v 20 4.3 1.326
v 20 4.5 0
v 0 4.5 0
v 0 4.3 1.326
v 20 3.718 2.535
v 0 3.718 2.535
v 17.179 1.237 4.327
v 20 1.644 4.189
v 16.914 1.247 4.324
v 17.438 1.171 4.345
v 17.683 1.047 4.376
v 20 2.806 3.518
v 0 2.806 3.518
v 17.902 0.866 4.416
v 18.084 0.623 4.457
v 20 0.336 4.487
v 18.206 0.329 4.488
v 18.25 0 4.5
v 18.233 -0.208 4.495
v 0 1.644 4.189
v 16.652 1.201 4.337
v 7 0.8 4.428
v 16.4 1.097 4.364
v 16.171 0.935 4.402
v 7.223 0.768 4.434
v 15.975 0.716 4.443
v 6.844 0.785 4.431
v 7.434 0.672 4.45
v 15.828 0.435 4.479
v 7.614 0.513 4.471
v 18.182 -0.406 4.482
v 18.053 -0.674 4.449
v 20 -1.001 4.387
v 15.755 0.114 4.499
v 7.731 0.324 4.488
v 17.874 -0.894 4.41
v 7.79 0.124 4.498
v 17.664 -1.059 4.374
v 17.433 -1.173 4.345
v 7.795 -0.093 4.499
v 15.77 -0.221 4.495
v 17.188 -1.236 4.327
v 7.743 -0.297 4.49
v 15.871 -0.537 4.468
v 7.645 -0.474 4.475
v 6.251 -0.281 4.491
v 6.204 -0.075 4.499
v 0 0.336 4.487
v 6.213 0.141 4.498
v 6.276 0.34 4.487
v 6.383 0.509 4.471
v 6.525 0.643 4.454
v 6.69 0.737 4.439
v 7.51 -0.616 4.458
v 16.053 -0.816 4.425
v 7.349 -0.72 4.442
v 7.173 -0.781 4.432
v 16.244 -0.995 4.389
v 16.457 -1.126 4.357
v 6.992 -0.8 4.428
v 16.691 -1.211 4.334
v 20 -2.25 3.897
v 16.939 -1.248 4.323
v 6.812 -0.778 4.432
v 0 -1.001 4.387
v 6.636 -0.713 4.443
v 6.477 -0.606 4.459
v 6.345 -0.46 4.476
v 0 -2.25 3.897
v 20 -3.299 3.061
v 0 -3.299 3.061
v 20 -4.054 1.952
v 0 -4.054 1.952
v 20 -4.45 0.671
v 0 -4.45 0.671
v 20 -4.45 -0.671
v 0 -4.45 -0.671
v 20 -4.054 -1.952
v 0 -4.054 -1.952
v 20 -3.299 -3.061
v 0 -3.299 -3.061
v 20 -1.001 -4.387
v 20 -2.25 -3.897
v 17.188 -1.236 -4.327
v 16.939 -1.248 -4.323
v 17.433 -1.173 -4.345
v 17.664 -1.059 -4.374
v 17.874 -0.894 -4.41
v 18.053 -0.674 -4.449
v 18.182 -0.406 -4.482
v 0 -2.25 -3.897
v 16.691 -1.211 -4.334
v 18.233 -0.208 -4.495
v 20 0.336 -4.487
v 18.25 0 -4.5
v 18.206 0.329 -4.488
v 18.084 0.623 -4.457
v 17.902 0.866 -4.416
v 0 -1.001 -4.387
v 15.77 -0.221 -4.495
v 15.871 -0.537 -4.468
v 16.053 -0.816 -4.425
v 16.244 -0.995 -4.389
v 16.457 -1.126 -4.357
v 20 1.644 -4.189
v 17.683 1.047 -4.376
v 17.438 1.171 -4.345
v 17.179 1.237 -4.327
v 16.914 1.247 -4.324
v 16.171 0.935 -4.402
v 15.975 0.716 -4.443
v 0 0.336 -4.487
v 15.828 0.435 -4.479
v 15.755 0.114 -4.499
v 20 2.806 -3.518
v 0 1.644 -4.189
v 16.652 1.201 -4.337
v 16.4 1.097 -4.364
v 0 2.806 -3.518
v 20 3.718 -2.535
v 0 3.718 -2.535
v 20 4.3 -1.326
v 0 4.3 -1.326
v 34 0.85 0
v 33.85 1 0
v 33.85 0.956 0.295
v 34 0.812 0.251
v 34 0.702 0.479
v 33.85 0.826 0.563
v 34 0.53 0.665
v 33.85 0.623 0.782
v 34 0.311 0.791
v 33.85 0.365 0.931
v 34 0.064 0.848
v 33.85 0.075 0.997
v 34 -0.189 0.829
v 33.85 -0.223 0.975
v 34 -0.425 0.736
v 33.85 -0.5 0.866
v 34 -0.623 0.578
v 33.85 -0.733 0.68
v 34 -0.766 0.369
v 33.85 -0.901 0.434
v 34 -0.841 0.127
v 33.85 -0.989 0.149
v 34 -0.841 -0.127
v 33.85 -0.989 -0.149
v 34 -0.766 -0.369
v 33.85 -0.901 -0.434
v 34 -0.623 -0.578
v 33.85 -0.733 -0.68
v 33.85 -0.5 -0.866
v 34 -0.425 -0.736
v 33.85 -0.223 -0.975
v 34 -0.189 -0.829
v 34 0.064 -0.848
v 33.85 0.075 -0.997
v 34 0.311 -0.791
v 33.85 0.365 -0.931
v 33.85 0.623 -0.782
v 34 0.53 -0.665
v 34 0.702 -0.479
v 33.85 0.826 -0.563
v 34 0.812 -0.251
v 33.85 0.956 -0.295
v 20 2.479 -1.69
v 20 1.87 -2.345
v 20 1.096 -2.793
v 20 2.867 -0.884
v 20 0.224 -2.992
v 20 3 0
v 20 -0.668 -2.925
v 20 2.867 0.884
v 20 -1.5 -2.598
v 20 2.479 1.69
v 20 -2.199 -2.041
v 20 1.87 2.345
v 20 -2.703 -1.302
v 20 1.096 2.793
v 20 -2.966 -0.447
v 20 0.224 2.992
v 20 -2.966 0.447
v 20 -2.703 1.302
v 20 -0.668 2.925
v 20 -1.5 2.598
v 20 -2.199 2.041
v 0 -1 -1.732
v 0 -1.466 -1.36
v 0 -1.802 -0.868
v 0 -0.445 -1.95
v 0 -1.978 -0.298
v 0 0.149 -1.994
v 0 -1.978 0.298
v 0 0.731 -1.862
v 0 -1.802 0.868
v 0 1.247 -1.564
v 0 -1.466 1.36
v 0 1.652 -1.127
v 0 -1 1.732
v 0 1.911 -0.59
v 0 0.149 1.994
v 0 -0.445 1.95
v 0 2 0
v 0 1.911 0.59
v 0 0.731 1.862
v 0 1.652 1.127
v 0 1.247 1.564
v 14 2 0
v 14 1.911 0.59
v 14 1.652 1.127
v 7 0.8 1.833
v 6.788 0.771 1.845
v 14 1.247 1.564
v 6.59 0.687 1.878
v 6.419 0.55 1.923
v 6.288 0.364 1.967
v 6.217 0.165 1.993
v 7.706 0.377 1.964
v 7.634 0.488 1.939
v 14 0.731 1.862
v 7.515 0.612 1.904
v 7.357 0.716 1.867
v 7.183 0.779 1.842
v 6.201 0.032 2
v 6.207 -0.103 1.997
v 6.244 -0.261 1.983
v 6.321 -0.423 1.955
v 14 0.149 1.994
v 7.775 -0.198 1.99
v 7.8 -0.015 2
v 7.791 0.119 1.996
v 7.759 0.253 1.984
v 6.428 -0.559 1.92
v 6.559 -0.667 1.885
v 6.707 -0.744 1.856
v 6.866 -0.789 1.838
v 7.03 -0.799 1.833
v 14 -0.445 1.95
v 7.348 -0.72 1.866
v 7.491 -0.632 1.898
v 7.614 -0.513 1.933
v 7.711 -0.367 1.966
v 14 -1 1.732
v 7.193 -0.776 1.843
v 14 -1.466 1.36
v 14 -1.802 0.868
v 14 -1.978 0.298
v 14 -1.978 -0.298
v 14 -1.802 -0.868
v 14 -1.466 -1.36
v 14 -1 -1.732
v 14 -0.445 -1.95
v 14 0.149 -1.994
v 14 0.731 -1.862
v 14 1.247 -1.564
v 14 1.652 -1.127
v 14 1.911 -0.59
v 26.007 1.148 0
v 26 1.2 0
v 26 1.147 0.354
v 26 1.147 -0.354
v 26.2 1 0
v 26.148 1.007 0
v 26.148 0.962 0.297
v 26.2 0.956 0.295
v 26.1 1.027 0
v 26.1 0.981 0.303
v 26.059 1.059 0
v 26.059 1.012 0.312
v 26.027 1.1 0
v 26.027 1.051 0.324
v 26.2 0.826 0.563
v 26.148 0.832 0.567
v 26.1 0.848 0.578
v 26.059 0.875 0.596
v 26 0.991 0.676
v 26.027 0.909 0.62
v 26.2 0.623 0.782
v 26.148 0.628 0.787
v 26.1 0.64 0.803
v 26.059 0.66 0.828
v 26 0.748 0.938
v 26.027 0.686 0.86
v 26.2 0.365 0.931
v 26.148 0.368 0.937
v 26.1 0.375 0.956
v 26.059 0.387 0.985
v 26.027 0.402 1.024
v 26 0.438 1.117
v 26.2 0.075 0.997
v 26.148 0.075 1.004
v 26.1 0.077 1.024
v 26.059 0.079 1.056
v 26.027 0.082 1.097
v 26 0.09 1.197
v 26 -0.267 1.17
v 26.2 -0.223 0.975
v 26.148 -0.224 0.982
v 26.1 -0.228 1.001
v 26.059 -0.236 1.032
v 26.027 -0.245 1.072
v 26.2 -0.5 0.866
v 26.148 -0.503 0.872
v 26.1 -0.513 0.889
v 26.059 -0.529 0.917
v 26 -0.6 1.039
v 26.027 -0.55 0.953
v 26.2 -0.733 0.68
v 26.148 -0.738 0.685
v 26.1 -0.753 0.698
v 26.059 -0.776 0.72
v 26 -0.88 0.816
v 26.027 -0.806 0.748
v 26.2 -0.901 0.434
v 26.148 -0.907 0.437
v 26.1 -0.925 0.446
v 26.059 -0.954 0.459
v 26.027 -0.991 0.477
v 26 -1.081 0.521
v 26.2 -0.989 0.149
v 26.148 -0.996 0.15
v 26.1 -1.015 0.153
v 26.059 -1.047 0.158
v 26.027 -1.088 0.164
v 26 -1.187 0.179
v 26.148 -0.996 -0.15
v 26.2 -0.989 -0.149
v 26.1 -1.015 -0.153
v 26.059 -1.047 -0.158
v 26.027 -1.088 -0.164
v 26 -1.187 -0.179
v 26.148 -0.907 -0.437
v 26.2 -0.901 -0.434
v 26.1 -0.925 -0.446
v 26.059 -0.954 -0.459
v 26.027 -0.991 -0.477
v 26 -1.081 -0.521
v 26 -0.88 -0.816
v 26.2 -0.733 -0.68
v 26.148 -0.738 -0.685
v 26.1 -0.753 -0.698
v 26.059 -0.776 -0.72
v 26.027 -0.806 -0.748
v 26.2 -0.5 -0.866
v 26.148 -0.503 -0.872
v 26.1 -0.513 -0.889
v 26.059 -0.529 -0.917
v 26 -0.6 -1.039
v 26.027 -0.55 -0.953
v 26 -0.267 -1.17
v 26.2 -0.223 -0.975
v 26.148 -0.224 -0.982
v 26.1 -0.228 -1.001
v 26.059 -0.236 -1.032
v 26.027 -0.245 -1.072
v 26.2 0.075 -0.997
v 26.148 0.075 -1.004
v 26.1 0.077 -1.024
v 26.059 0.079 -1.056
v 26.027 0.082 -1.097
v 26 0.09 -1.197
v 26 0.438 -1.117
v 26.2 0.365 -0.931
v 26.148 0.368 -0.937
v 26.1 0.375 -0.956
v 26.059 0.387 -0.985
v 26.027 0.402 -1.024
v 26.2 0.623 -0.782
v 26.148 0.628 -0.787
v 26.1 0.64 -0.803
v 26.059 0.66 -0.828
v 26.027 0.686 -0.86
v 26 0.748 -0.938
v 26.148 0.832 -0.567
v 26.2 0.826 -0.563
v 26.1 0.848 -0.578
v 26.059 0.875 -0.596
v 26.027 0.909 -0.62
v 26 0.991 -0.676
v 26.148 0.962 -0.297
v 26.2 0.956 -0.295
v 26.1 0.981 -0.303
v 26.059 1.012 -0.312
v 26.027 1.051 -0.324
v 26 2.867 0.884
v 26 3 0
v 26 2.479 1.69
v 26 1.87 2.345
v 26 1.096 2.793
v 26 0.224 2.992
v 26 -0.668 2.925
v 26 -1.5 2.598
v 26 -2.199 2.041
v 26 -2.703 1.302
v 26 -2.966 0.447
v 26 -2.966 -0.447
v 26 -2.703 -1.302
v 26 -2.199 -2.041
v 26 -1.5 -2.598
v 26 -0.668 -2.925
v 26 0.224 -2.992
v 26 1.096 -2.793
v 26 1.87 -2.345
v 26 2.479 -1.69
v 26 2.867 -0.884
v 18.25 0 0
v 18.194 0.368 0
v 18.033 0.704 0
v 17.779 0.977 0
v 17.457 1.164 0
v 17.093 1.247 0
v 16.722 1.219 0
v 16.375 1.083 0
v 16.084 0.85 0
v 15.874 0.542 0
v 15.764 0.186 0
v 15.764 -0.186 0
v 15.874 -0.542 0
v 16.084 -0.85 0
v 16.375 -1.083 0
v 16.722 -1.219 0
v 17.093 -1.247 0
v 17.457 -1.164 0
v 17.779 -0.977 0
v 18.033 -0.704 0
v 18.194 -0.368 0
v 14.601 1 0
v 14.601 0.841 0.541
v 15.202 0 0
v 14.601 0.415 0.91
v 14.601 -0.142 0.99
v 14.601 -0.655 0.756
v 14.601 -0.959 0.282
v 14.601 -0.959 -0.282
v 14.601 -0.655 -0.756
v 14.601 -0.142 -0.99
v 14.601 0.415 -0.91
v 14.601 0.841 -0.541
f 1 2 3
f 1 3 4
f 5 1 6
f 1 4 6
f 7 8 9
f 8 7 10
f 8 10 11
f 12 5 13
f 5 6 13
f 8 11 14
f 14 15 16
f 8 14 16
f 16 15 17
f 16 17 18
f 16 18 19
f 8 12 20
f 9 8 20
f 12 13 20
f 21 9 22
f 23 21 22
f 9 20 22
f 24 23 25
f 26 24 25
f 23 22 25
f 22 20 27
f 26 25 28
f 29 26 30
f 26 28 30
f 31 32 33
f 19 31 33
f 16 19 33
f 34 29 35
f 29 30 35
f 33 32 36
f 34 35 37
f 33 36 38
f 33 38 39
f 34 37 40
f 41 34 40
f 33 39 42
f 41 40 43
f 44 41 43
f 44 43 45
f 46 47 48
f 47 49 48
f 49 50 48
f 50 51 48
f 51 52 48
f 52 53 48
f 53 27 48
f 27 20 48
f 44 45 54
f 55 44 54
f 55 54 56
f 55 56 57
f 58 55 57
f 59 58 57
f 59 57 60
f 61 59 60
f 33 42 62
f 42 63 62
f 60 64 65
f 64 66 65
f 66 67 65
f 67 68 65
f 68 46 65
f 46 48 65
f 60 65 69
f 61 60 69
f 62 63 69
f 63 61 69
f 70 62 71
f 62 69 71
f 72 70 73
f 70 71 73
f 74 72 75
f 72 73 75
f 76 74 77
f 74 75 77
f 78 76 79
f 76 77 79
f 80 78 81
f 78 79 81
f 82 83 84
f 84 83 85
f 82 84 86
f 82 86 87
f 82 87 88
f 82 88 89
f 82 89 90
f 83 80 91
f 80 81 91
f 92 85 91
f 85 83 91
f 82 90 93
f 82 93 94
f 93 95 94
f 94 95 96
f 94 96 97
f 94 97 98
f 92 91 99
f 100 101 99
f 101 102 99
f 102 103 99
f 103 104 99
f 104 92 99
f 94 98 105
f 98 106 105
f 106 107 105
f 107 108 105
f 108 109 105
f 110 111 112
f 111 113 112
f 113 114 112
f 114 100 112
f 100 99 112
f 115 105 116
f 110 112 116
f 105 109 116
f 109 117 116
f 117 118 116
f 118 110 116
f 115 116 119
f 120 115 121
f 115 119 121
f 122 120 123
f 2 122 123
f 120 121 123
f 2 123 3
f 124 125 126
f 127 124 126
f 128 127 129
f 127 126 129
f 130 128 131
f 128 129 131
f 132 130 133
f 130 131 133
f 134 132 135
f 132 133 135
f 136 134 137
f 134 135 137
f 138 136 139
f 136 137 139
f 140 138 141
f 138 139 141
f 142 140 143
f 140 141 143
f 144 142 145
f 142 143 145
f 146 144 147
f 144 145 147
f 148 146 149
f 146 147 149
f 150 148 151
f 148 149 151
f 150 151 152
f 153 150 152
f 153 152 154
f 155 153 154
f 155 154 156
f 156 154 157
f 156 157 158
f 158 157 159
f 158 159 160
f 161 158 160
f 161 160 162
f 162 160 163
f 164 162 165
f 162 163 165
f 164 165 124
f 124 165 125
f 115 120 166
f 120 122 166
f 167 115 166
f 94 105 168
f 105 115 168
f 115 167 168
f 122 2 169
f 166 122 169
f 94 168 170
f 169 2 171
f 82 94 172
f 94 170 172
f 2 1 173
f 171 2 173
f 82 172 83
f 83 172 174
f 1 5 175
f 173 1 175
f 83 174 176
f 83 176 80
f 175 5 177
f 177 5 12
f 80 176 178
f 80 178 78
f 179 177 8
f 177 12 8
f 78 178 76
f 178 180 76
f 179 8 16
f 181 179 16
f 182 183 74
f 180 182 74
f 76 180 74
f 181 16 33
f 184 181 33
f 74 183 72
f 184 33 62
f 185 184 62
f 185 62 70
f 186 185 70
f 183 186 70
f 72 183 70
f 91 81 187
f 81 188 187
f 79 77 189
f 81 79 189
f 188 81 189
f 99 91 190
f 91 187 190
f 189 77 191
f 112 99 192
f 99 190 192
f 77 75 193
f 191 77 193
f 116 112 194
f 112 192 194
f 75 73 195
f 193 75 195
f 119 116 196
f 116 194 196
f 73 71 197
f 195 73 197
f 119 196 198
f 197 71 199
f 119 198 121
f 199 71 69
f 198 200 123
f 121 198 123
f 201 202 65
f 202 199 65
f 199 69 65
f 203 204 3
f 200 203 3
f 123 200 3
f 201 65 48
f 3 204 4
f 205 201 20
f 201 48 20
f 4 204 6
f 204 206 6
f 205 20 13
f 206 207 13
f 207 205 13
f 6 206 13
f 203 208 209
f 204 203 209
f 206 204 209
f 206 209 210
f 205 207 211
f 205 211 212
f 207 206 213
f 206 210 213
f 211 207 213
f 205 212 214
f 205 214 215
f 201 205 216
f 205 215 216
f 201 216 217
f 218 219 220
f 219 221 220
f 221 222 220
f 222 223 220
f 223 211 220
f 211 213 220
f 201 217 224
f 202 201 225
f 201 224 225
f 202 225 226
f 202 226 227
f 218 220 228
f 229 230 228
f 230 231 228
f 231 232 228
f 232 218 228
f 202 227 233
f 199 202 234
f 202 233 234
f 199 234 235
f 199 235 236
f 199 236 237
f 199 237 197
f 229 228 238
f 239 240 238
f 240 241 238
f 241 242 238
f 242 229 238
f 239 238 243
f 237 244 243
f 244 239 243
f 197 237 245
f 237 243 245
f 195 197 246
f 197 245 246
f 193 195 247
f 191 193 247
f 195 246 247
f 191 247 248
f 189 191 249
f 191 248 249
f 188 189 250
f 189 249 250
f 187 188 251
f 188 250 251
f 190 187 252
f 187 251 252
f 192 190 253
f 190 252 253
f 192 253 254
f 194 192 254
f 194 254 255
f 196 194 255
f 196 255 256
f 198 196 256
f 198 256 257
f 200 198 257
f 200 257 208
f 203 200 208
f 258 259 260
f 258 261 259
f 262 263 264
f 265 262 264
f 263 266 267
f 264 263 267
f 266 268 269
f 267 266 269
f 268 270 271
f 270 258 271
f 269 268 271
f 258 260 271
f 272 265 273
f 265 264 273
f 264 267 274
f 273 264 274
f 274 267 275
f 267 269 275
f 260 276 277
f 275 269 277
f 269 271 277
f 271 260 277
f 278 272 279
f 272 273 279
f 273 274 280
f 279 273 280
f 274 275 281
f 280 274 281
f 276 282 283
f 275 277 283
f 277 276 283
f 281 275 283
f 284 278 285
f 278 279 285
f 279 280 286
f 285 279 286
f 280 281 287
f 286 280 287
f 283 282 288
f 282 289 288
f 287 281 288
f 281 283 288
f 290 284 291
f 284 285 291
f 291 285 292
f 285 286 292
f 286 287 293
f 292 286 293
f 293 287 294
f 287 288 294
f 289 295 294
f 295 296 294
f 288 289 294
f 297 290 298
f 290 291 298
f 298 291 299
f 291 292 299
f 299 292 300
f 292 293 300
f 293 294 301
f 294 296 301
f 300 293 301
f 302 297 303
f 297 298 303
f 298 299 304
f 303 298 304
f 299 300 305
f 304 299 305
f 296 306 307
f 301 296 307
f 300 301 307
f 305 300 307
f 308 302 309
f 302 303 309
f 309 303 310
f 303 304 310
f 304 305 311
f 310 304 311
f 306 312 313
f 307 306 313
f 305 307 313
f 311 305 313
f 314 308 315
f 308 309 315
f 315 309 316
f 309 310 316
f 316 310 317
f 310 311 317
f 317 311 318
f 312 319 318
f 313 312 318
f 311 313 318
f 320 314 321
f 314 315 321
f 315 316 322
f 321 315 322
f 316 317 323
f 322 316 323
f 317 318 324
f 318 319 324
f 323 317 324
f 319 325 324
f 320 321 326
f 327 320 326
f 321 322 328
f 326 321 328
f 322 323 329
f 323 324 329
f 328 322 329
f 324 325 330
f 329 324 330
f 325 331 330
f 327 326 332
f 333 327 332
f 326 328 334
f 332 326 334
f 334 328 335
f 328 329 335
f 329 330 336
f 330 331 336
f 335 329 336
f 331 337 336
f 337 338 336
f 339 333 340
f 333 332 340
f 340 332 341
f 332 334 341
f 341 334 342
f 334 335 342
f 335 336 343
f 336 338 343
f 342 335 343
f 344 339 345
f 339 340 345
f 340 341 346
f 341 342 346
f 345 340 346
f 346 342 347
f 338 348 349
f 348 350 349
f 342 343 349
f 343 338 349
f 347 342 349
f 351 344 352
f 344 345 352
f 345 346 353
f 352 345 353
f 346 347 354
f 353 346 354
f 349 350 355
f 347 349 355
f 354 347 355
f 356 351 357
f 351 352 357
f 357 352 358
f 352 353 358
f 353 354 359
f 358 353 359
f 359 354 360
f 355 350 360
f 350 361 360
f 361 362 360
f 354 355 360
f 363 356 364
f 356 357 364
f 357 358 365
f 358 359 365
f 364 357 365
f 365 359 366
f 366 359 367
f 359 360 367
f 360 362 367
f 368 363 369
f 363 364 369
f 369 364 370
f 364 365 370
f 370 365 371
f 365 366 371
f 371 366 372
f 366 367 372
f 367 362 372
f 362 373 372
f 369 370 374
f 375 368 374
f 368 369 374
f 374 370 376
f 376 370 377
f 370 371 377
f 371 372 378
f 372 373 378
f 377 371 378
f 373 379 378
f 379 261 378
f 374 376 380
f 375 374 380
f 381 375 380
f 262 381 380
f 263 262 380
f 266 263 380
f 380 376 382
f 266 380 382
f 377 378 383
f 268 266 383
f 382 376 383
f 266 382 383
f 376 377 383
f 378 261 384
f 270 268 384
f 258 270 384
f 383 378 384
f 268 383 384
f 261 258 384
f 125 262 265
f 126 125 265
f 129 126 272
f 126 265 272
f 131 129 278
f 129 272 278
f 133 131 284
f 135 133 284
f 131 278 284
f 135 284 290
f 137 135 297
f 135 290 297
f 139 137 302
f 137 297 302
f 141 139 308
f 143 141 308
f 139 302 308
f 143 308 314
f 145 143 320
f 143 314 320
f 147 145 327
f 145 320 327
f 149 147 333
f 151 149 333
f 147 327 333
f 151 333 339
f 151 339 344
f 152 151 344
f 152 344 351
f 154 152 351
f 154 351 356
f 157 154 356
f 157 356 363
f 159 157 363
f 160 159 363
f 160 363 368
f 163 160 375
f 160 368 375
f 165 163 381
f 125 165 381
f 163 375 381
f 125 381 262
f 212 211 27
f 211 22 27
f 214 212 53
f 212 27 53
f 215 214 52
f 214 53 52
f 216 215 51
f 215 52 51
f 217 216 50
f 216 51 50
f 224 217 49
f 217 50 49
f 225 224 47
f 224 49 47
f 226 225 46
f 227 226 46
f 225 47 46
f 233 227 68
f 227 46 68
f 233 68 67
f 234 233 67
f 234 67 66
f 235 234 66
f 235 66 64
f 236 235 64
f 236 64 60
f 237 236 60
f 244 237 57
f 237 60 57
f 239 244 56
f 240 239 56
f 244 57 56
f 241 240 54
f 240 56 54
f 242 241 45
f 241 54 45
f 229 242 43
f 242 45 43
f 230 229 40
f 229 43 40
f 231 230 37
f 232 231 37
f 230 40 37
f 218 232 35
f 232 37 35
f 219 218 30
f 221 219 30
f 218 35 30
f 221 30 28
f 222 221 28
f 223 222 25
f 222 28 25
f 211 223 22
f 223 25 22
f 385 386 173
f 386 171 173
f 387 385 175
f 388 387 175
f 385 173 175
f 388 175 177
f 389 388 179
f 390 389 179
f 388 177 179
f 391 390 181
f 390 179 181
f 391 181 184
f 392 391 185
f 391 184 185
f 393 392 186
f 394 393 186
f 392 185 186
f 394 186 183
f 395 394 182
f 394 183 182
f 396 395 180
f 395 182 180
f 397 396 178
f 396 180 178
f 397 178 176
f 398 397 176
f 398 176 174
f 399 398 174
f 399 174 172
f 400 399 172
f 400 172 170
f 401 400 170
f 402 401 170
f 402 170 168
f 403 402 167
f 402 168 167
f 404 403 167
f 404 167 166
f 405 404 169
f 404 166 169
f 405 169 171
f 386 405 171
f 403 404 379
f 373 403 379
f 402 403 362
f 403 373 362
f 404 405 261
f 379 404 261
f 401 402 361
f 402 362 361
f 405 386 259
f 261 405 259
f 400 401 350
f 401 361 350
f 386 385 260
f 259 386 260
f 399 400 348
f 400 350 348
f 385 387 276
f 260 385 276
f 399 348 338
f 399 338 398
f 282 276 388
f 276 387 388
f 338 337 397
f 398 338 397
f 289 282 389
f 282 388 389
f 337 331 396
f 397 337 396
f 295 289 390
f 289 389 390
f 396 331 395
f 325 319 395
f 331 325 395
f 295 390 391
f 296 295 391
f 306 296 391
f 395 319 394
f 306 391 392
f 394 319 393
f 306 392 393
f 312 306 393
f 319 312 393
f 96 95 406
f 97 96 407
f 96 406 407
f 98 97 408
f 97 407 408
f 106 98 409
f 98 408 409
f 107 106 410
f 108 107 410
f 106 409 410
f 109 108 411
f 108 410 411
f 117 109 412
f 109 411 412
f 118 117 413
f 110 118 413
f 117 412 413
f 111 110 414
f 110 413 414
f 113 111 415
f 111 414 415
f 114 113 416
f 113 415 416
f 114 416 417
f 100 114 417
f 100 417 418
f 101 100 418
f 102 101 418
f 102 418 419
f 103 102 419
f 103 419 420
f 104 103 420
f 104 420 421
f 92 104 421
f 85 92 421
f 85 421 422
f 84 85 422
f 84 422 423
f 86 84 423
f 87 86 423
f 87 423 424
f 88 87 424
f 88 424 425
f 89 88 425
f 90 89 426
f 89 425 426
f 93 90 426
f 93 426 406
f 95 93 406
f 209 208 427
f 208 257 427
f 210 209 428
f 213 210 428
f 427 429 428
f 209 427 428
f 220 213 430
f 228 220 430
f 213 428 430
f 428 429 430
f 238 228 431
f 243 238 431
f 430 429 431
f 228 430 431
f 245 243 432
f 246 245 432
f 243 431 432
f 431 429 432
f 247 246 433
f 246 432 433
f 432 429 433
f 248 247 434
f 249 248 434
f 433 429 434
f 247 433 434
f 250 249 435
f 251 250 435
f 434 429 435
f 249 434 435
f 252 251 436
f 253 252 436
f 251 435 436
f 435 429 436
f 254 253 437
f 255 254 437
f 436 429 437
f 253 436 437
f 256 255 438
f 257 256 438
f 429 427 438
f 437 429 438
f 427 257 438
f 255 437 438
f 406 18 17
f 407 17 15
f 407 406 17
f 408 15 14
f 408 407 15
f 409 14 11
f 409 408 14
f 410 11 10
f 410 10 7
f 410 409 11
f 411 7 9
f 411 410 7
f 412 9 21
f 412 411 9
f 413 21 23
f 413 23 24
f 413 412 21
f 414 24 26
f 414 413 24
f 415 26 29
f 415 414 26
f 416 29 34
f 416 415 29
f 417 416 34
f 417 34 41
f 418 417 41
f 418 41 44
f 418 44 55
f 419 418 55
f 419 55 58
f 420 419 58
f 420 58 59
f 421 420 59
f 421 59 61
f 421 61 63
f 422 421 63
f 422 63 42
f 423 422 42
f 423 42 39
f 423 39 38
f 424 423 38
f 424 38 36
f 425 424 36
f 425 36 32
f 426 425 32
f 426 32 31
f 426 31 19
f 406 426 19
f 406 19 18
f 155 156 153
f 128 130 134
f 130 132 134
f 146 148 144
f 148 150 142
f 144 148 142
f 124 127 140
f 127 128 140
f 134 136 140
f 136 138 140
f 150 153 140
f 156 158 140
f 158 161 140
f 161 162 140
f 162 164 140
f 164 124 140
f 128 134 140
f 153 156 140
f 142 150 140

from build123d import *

# Parameters (mm, degrees)
FASE1_SIZE                           = 0.15
SKIZZE5_W                            = 0.8
SKIZZE5_H                            = 4.5
SKIZZE7_R                            = 1.25
SCHNITT_LINEAR_AUSTRAGEN2_DEPTH      = 5.50000011
SCHNITT_LINEAR_AUSTRAGEN2_DEPTH_BACK = 5.5000001
VERRUNDUNG1_R                        = 0.2


with BuildPart() as part:
    # Skizze1 → Rotation1 (revolve)
    with BuildSketch(Plane.XY):
        Polygon((0, 4.5), (0, 2), (14, 2), (15.201721238, 0), (34, 0), (34, 1), (26, 1), (26, 3), (20, 3), (20, 4.5), align=None)
    revolve(axis=Axis((0, 0, 0), (1, 0, 0)))

    # Fase1
    fase1_edges = [part.edges().sort_by_distance(p)[0] for p in [
        (34, -1, 0),
    ]]
    chamfer(fase1_edges, length=FASE1_SIZE)

    # Skizze5 → M2 Gewindebohrung1 (revolve, cut)
    with BuildSketch(Plane.YZ.offset(7)):
        with Locations((0.4, 2.25)):
            Rectangle(SKIZZE5_W, SKIZZE5_H)
    revolve(axis=Axis((7, 0, -6.35), (0, 0, 1)), mode=Mode.SUBTRACT)

    # Skizze7 → Schnitt-Linear austragen2 (cut, two sides)
    with BuildSketch(Plane.XY) as schnitt_linear_austragen2_sk:
        with Locations((17, 0)):
            Circle(SKIZZE7_R)
    extrude(amount=SCHNITT_LINEAR_AUSTRAGEN2_DEPTH, mode=Mode.SUBTRACT)
    extrude(schnitt_linear_austragen2_sk.sketch, amount=-SCHNITT_LINEAR_AUSTRAGEN2_DEPTH_BACK, mode=Mode.SUBTRACT)

    # Verrundung1
    verrundung1_edges = [part.edges().sort_by_distance(p)[0] for p in [
        (26, -1, 0),
    ]]
    fillet(verrundung1_edges, radius=VERRUNDUNG1_R)


solid = part.part
